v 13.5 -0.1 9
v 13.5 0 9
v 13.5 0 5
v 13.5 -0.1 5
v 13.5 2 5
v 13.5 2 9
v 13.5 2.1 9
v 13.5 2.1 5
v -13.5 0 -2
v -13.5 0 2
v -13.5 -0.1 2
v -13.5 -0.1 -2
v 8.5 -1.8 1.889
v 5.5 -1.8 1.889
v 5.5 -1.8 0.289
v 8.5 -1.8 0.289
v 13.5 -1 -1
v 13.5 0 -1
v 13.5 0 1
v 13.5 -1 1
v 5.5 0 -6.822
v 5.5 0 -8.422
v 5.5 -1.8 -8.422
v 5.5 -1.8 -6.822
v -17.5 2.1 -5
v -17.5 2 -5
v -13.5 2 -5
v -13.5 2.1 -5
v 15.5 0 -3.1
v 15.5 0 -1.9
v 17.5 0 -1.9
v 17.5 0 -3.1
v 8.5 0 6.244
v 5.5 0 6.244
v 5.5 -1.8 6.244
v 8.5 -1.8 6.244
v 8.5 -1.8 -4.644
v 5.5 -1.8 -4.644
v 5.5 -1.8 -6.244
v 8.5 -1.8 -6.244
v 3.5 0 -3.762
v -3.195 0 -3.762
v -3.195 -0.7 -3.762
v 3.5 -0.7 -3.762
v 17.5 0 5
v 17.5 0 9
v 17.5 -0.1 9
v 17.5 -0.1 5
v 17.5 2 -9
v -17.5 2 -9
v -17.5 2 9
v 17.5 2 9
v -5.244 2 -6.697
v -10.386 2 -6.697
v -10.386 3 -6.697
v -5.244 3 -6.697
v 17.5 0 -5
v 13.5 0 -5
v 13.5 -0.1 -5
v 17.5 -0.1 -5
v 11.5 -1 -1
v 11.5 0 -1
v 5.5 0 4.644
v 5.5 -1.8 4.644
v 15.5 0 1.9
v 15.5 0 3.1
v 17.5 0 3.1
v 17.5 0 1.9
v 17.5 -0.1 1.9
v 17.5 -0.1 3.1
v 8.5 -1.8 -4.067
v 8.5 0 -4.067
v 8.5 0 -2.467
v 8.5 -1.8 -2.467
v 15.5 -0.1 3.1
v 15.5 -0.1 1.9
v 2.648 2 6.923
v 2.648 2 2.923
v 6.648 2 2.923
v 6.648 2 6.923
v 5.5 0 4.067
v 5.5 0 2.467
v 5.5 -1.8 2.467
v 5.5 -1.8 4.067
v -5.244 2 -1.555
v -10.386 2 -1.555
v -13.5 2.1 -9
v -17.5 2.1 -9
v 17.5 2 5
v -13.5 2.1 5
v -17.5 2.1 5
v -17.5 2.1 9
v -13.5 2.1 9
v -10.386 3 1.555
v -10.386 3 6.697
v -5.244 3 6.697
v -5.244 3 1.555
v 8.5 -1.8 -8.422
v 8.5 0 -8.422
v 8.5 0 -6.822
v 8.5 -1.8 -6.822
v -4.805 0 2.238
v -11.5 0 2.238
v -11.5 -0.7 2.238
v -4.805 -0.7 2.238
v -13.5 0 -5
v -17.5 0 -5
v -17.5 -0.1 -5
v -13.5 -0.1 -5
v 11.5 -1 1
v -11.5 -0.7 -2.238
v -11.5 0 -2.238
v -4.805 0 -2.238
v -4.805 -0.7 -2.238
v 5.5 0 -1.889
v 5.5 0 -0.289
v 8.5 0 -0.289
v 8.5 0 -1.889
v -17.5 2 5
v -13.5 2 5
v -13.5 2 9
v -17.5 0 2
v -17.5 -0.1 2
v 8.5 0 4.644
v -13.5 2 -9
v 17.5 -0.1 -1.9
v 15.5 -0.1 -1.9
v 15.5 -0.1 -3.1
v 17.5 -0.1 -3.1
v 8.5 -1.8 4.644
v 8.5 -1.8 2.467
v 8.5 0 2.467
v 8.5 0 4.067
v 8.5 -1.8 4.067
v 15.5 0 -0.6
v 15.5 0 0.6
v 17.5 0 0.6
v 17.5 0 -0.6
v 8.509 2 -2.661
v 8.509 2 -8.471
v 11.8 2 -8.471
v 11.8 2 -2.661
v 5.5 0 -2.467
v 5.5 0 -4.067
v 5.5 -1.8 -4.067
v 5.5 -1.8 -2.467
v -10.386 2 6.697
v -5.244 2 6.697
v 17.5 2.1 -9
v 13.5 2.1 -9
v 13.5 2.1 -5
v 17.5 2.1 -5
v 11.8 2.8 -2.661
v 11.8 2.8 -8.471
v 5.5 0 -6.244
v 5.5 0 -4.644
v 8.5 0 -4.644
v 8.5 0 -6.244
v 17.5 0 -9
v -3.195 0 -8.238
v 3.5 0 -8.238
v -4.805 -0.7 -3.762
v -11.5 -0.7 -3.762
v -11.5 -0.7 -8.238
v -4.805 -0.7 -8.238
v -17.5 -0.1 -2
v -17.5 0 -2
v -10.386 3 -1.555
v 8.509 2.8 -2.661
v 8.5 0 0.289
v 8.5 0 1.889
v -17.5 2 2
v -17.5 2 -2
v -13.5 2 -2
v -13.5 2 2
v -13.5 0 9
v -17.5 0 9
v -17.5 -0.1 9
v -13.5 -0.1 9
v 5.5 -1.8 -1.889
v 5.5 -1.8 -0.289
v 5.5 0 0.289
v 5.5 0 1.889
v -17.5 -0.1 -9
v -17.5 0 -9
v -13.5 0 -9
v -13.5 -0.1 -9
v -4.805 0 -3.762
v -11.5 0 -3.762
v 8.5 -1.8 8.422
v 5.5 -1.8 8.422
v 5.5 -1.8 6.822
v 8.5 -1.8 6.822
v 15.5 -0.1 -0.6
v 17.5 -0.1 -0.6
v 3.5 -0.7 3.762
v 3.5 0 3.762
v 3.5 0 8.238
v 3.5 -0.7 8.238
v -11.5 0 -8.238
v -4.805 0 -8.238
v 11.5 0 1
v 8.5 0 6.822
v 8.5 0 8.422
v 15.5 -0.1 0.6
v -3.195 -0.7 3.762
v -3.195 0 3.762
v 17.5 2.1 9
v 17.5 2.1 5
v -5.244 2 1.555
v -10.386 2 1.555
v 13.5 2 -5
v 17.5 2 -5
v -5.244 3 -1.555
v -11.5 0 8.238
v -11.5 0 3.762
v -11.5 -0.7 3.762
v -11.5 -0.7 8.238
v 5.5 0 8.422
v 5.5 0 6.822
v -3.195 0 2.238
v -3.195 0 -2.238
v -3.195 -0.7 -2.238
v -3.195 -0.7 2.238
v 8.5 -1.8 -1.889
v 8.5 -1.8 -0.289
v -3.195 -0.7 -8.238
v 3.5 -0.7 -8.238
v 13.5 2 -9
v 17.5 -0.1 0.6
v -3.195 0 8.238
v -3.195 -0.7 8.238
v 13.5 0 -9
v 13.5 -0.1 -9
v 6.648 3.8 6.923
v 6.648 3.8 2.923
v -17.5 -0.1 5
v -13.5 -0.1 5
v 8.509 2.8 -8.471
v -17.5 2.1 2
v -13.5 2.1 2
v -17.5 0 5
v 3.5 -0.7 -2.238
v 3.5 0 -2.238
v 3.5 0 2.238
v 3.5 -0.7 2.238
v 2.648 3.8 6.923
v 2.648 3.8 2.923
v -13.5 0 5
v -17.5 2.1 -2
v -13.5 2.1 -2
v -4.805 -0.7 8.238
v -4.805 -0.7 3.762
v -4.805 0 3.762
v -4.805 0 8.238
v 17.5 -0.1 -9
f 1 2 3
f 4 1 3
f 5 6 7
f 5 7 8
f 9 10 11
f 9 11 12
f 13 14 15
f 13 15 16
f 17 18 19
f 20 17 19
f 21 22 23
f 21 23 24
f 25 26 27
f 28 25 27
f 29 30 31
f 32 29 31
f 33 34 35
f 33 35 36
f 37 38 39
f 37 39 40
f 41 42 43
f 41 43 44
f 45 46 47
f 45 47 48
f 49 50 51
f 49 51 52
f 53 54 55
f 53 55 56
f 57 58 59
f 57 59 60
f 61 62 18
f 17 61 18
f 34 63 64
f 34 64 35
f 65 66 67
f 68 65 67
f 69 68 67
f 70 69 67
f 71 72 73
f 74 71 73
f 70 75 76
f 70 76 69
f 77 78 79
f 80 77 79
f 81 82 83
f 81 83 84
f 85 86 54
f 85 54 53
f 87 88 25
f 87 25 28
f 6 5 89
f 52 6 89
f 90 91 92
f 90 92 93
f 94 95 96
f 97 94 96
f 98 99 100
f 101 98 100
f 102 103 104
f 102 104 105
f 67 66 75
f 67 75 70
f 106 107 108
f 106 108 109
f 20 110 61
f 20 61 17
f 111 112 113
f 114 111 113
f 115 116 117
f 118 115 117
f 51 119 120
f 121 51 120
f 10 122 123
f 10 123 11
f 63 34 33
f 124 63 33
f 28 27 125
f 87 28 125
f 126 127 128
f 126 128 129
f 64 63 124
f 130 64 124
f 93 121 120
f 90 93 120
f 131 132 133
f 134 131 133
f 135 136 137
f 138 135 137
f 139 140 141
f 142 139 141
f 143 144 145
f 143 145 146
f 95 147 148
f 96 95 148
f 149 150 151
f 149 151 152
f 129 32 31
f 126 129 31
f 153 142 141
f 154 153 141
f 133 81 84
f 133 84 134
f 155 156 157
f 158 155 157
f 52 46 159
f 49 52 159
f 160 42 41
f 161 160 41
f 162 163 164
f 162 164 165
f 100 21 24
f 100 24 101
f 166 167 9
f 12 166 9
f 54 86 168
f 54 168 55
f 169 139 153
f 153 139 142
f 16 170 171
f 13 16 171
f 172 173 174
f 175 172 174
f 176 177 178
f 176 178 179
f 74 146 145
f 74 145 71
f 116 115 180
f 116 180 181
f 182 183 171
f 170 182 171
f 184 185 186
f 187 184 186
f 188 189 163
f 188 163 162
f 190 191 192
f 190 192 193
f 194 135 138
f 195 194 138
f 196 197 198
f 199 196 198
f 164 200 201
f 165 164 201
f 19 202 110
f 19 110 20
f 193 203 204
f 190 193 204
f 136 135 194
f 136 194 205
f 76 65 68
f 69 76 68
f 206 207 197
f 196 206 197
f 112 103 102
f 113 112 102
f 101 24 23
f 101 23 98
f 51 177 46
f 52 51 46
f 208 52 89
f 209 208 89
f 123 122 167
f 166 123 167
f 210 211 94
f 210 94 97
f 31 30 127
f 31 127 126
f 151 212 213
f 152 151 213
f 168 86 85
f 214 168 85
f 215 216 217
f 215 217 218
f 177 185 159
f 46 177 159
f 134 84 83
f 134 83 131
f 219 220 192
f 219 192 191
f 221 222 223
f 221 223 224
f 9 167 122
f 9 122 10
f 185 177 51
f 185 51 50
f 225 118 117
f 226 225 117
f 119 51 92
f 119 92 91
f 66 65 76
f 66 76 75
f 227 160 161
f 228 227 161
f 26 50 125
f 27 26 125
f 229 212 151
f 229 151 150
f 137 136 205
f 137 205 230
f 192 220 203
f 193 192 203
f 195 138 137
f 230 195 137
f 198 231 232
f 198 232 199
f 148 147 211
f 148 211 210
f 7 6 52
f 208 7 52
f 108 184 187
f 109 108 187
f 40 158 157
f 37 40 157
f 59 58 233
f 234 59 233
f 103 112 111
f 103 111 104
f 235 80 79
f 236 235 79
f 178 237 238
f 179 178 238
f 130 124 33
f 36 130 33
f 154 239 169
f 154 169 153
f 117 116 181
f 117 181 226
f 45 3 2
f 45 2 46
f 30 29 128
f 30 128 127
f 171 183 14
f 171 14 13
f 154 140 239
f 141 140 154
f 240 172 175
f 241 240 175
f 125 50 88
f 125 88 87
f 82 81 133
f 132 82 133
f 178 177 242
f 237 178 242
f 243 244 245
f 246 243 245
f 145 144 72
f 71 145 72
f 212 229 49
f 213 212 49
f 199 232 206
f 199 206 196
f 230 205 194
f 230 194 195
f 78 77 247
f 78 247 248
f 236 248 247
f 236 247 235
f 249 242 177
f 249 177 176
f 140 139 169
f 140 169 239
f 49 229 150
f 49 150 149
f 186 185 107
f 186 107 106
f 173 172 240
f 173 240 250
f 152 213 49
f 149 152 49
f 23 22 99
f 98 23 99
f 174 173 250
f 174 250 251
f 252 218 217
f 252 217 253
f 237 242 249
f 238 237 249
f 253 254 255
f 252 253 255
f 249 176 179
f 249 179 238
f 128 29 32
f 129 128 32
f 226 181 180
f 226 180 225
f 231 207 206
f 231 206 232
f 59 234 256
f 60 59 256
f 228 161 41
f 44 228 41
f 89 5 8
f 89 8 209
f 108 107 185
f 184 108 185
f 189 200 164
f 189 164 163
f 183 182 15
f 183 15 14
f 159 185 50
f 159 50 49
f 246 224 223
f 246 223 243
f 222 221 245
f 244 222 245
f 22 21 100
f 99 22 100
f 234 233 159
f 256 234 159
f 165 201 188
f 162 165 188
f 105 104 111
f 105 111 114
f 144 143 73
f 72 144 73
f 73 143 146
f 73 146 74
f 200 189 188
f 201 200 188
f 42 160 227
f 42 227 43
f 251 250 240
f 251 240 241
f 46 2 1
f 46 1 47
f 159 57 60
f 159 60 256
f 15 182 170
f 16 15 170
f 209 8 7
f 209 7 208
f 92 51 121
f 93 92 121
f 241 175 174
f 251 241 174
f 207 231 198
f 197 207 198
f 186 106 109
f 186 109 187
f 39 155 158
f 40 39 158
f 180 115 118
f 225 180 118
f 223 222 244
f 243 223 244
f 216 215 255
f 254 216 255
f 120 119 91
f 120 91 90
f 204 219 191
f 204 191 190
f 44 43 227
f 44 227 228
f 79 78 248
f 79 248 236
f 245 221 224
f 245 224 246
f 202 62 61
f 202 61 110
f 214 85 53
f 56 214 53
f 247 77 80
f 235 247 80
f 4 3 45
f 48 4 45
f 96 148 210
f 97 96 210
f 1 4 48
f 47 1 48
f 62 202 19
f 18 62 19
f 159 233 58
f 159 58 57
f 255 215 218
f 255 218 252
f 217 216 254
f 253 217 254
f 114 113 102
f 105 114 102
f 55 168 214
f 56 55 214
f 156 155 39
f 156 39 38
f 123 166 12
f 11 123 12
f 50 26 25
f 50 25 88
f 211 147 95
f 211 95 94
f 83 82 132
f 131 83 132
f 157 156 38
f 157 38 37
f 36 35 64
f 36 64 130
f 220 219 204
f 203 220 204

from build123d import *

# Parameters (mm, degrees)
SKETCH1_W             = 35
SKETCH1_H             = 18
BOSS_EXTRUDE1_DEPTH   = 2
SKETCH2_W             = 3.290634233
SKETCH2_H             = 5.810026068
BOSS_EXTRUDE2_DEPTH   = 0.8
SKETCH3_W             = 4
SKETCH3_H             = 4
BOSS_EXTRUDE3_DEPTH   = 1.8
SKETCH4_W             = 5.141615989
SKETCH4_H             = 5.141615989
BOSS_EXTRUDE4_DEPTH   = 1
BOSS_EXTRUDE4_2_DEPTH = 1
SKETCH5_W             = 4
SKETCH5_H             = 4
BOSS_EXTRUDE5_DEPTH   = 0.1
BOSS_EXTRUDE5_2_DEPTH = 0.1
BOSS_EXTRUDE5_3_DEPTH = 0.1
BOSS_EXTRUDE5_4_DEPTH = 0.1
BOSS_EXTRUDE5_5_DEPTH = 0.1
SKETCH6_W             = 6.694846846
SKETCH6_H             = 4.476078856
BOSS_EXTRUDE6_DEPTH   = 0.7
BOSS_EXTRUDE6_2_DEPTH = 0.7
BOSS_EXTRUDE6_3_DEPTH = 0.7
BOSS_EXTRUDE6_4_DEPTH = 0.7
BOSS_EXTRUDE6_5_DEPTH = 0.7
BOSS_EXTRUDE6_6_DEPTH = 0.7
SKETCH7_W             = 3
SKETCH7_H             = 1.6
BOSS_EXTRUDE7_DEPTH   = 1.8
BOSS_EXTRUDE7_2_DEPTH = 1.8
BOSS_EXTRUDE7_3_DEPTH = 1.8
BOSS_EXTRUDE7_4_DEPTH = 1.8
BOSS_EXTRUDE7_5_DEPTH = 1.8
BOSS_EXTRUDE7_6_DEPTH = 1.8
BOSS_EXTRUDE7_7_DEPTH = 1.8
BOSS_EXTRUDE7_8_DEPTH = 1.8
SKETCH8_W             = 2
SKETCH8_H             = 1.2
BOSS_EXTRUDE8_DEPTH   = 0.1
BOSS_EXTRUDE8_2_DEPTH = 0.1
BOSS_EXTRUDE8_3_DEPTH = 0.1
SKETCH9_W             = 2
SKETCH9_H             = 2
BOSS_EXTRUDE9_DEPTH   = 1


with BuildPart() as part:
    # Sketch1 → Boss-Extrude1 (new body)
    with BuildSketch(Plane(origin=(0, 0, 0), x_dir=(1, 0, 0), z_dir=(0, 1, 0))):
        Rectangle(SKETCH1_W, SKETCH1_H)
    extrude(amount=BOSS_EXTRUDE1_DEPTH)


with BuildPart() as body_2:
    # Sketch2 → Boss-Extrude2 (new body)
    with BuildSketch(Plane(origin=(0, 2, 0), x_dir=(1, 0, 0), z_dir=(0, 1, 0))):
        with Locations((10.154691578, 5.565799308)):
            Rectangle(SKETCH2_W, SKETCH2_H)
    extrude(amount=BOSS_EXTRUDE2_DEPTH)


with BuildPart() as body_3:
    # Sketch3 → Boss-Extrude3 (new body)
    with BuildSketch(Plane(origin=(0, 2, 0), x_dir=(1, 0, 0), z_dir=(0, 1, 0))):
        with Locations((4.647932234, -4.923097309)):
            Rectangle(SKETCH3_W, SKETCH3_H)
    extrude(amount=BOSS_EXTRUDE3_DEPTH)


with BuildPart() as body_4:
    # Sketch4 → Boss-Extrude4 (new body)
    with BuildSketch(Plane(origin=(0, 2, 0), x_dir=(1, 0, 0), z_dir=(0, 1, 0))):
        with Locations((-7.815256304, -4.126146832)):
            Rectangle(SKETCH4_W, SKETCH4_H)
    extrude(amount=BOSS_EXTRUDE4_DEPTH)


with BuildPart() as body_5:
    # Sketch4 → Boss-Extrude4 2 (new body)
    with BuildSketch(Plane(origin=(0, 2, 0), x_dir=(1, 0, 0), z_dir=(0, 1, 0))):
        with Locations((-7.815256304, 4.126146832)):
            Rectangle(SKETCH4_W, SKETCH4_H)
    extrude(amount=BOSS_EXTRUDE4_2_DEPTH)


with BuildPart() as body_6:
    # Sketch5 → Boss-Extrude5 (new body)
    with BuildSketch(Plane(origin=(0, 2, 0), x_dir=(1, 0, 0), z_dir=(0, 1, 0))):
        with Locations((-15.5, 7)):
            Rectangle(SKETCH5_W, SKETCH5_H)
    extrude(amount=BOSS_EXTRUDE5_DEPTH)


with BuildPart() as body_7:
    # Sketch5 → Boss-Extrude5 2 (new body)
    with BuildSketch(Plane(origin=(0, 2, 0), x_dir=(1, 0, 0), z_dir=(0, 1, 0))):
        with Locations((-15.5, 0)):
            Rectangle(SKETCH5_W, SKETCH5_H)
    extrude(amount=BOSS_EXTRUDE5_2_DEPTH)


with BuildPart() as body_8:
    # Sketch5 → Boss-Extrude5 3 (new body)
    with BuildSketch(Plane(origin=(0, 2, 0), x_dir=(1, 0, 0), z_dir=(0, 1, 0))):
        with Locations((15.5, -7)):
            Rectangle(SKETCH5_W, SKETCH5_H)
    extrude(amount=BOSS_EXTRUDE5_3_DEPTH)


with BuildPart() as body_9:
    # Sketch5 → Boss-Extrude5 4 (new body)
    with BuildSketch(Plane(origin=(0, 2, 0), x_dir=(1, 0, 0), z_dir=(0, 1, 0))):
        with Locations((-15.5, -7)):
            Rectangle(SKETCH5_W, SKETCH5_H)
    extrude(amount=BOSS_EXTRUDE5_4_DEPTH)


with BuildPart() as body_10:
    # Sketch5 → Boss-Extrude5 5 (new body)
    with BuildSketch(Plane(origin=(0, 2, 0), x_dir=(1, 0, 0), z_dir=(0, 1, 0))):
        with Locations((15.5, 7)):
            Rectangle(SKETCH5_W, SKETCH5_H)
    extrude(amount=BOSS_EXTRUDE5_5_DEPTH)


with BuildPart() as body_11:
    # Mirror1: mirrored copy
    add(body_6.part.mirror(Plane.ZX.offset(1)))


with BuildPart() as body_12:
    # Mirror1 2: mirrored copy
    add(body_7.part.mirror(Plane.ZX.offset(1)))


with BuildPart() as body_13:
    # Mirror1 3: mirrored copy
    add(body_9.part.mirror(Plane.ZX.offset(1)))


with BuildPart() as body_14:
    # Mirror1 4: mirrored copy
    add(body_10.part.mirror(Plane.ZX.offset(1)))


with BuildPart() as body_15:
    # Mirror1 5: mirrored copy
    add(body_8.part.mirror(Plane.ZX.offset(1)))


with BuildPart() as body_16:
    # Sketch6 → Boss-Extrude6 (new body)
    with BuildSketch(Plane.XZ):
        with Locations((-8.152576577, -6)):
            Rectangle(SKETCH6_W, SKETCH6_H)
    extrude(amount=BOSS_EXTRUDE6_DEPTH)


with BuildPart() as body_17:
    # Sketch6 → Boss-Extrude6 2 (new body)
    with BuildSketch(Plane.XZ):
        with Locations((-8.152576577, 6)):
            Rectangle(SKETCH6_W, SKETCH6_H)
    extrude(amount=BOSS_EXTRUDE6_2_DEPTH)


with BuildPart() as body_18:
    # Sketch6 → Boss-Extrude6 3 (new body)
    with BuildSketch(Plane.XZ):
        with Locations((-8.152576577, 0)):
            Rectangle(SKETCH6_W, SKETCH6_H)
    extrude(amount=BOSS_EXTRUDE6_3_DEPTH)


with BuildPart() as body_19:
    # Sketch6 → Boss-Extrude6 4 (new body)
    with BuildSketch(Plane.XZ):
        with Locations((0.152576577, -6)):
            Rectangle(SKETCH6_W, SKETCH6_H)
    extrude(amount=BOSS_EXTRUDE6_4_DEPTH)


with BuildPart() as body_20:
    # Sketch6 → Boss-Extrude6 5 (new body)
    with BuildSketch(Plane.XZ):
        with Locations((0.152576577, 0)):
            Rectangle(SKETCH6_W, SKETCH6_H)
    extrude(amount=BOSS_EXTRUDE6_5_DEPTH)


with BuildPart() as body_21:
    # Sketch6 → Boss-Extrude6 6 (new body)
    with BuildSketch(Plane.XZ):
        with Locations((0.152576577, 6)):
            Rectangle(SKETCH6_W, SKETCH6_H)
    extrude(amount=BOSS_EXTRUDE6_6_DEPTH)


with BuildPart() as body_22:
    # Sketch7 → Boss-Extrude7 (new body)
    with BuildSketch(Plane.XZ):
        with Locations((7, 5.444444444)):
            Rectangle(SKETCH7_W, SKETCH7_H)
    extrude(amount=BOSS_EXTRUDE7_DEPTH)


with BuildPart() as body_23:
    # Sketch7 → Boss-Extrude7 2 (new body)
    with BuildSketch(Plane.XZ):
        with Locations((7, 7.622222222)):
            Rectangle(SKETCH7_W, SKETCH7_H)
    extrude(amount=BOSS_EXTRUDE7_2_DEPTH)


with BuildPart() as body_24:
    # Sketch7 → Boss-Extrude7 3 (new body)
    with BuildSketch(Plane.XZ):
        with Locations((7, 3.266666667)):
            Rectangle(SKETCH7_W, SKETCH7_H)
    extrude(amount=BOSS_EXTRUDE7_3_DEPTH)


with BuildPart() as body_25:
    # Sketch7 → Boss-Extrude7 4 (new body)
    with BuildSketch(Plane.XZ):
        with Locations((7, 1.088888889)):
            Rectangle(SKETCH7_W, SKETCH7_H)
    extrude(amount=BOSS_EXTRUDE7_4_DEPTH)


with BuildPart() as body_26:
    # Sketch7 → Boss-Extrude7 5 (new body)
    with BuildSketch(Plane.XZ):
        with Locations((7, -1.088888889)):
            Rectangle(SKETCH7_W, SKETCH7_H)
    extrude(amount=BOSS_EXTRUDE7_5_DEPTH)


with BuildPart() as body_27:
    # Sketch7 → Boss-Extrude7 6 (new body)
    with BuildSketch(Plane.XZ):
        with Locations((7, -3.266666667)):
            Rectangle(SKETCH7_W, SKETCH7_H)
    extrude(amount=BOSS_EXTRUDE7_6_DEPTH)


with BuildPart() as body_28:
    # Sketch7 → Boss-Extrude7 7 (new body)
    with BuildSketch(Plane.XZ):
        with Locations((7, -5.444444444)):
            Rectangle(SKETCH7_W, SKETCH7_H)
    extrude(amount=BOSS_EXTRUDE7_7_DEPTH)


with BuildPart() as body_29:
    # Sketch7 → Boss-Extrude7 8 (new body)
    with BuildSketch(Plane.XZ):
        with Locations((7, -7.622222222)):
            Rectangle(SKETCH7_W, SKETCH7_H)
    extrude(amount=BOSS_EXTRUDE7_8_DEPTH)


with BuildPart() as body_30:
    # Sketch8 → Boss-Extrude8 (new body)
    with BuildSketch(Plane.XZ):
        with Locations((16.5, 0)):
            Rectangle(SKETCH8_W, SKETCH8_H)
    extrude(amount=BOSS_EXTRUDE8_DEPTH)


with BuildPart() as body_31:
    # Sketch8 → Boss-Extrude8 2 (new body)
    with BuildSketch(Plane.XZ):
        with Locations((16.5, 2.5)):
            Rectangle(SKETCH8_W, SKETCH8_H)
    extrude(amount=BOSS_EXTRUDE8_2_DEPTH)


with BuildPart() as body_32:
    # Sketch8 → Boss-Extrude8 3 (new body)
    with BuildSketch(Plane.XZ):
        with Locations((16.5, -2.5)):
            Rectangle(SKETCH8_W, SKETCH8_H)
    extrude(amount=BOSS_EXTRUDE8_3_DEPTH)


with BuildPart() as body_33:
    # Sketch9 → Boss-Extrude9 (new body)
    with BuildSketch(Plane.XZ):
        with Locations((12.5, 0)):
            Rectangle(SKETCH9_W, SKETCH9_H)
    extrude(amount=BOSS_EXTRUDE9_DEPTH)


solid = Compound([part.part, body_2.part, body_3.part, body_4.part, body_5.part, body_6.part, body_7.part, body_8.part, body_9.part, body_10.part, body_11.part, body_12.part, body_13.part, body_14.part, body_15.part, body_16.part, body_17.part, body_18.part, body_19.part, body_20.part, body_21.part, body_22.part, body_23.part, body_24.part, body_25.part, body_26.part, body_27.part, body_28.part, body_29.part, body_30.part, body_31.part, body_32.part, body_33.part])
